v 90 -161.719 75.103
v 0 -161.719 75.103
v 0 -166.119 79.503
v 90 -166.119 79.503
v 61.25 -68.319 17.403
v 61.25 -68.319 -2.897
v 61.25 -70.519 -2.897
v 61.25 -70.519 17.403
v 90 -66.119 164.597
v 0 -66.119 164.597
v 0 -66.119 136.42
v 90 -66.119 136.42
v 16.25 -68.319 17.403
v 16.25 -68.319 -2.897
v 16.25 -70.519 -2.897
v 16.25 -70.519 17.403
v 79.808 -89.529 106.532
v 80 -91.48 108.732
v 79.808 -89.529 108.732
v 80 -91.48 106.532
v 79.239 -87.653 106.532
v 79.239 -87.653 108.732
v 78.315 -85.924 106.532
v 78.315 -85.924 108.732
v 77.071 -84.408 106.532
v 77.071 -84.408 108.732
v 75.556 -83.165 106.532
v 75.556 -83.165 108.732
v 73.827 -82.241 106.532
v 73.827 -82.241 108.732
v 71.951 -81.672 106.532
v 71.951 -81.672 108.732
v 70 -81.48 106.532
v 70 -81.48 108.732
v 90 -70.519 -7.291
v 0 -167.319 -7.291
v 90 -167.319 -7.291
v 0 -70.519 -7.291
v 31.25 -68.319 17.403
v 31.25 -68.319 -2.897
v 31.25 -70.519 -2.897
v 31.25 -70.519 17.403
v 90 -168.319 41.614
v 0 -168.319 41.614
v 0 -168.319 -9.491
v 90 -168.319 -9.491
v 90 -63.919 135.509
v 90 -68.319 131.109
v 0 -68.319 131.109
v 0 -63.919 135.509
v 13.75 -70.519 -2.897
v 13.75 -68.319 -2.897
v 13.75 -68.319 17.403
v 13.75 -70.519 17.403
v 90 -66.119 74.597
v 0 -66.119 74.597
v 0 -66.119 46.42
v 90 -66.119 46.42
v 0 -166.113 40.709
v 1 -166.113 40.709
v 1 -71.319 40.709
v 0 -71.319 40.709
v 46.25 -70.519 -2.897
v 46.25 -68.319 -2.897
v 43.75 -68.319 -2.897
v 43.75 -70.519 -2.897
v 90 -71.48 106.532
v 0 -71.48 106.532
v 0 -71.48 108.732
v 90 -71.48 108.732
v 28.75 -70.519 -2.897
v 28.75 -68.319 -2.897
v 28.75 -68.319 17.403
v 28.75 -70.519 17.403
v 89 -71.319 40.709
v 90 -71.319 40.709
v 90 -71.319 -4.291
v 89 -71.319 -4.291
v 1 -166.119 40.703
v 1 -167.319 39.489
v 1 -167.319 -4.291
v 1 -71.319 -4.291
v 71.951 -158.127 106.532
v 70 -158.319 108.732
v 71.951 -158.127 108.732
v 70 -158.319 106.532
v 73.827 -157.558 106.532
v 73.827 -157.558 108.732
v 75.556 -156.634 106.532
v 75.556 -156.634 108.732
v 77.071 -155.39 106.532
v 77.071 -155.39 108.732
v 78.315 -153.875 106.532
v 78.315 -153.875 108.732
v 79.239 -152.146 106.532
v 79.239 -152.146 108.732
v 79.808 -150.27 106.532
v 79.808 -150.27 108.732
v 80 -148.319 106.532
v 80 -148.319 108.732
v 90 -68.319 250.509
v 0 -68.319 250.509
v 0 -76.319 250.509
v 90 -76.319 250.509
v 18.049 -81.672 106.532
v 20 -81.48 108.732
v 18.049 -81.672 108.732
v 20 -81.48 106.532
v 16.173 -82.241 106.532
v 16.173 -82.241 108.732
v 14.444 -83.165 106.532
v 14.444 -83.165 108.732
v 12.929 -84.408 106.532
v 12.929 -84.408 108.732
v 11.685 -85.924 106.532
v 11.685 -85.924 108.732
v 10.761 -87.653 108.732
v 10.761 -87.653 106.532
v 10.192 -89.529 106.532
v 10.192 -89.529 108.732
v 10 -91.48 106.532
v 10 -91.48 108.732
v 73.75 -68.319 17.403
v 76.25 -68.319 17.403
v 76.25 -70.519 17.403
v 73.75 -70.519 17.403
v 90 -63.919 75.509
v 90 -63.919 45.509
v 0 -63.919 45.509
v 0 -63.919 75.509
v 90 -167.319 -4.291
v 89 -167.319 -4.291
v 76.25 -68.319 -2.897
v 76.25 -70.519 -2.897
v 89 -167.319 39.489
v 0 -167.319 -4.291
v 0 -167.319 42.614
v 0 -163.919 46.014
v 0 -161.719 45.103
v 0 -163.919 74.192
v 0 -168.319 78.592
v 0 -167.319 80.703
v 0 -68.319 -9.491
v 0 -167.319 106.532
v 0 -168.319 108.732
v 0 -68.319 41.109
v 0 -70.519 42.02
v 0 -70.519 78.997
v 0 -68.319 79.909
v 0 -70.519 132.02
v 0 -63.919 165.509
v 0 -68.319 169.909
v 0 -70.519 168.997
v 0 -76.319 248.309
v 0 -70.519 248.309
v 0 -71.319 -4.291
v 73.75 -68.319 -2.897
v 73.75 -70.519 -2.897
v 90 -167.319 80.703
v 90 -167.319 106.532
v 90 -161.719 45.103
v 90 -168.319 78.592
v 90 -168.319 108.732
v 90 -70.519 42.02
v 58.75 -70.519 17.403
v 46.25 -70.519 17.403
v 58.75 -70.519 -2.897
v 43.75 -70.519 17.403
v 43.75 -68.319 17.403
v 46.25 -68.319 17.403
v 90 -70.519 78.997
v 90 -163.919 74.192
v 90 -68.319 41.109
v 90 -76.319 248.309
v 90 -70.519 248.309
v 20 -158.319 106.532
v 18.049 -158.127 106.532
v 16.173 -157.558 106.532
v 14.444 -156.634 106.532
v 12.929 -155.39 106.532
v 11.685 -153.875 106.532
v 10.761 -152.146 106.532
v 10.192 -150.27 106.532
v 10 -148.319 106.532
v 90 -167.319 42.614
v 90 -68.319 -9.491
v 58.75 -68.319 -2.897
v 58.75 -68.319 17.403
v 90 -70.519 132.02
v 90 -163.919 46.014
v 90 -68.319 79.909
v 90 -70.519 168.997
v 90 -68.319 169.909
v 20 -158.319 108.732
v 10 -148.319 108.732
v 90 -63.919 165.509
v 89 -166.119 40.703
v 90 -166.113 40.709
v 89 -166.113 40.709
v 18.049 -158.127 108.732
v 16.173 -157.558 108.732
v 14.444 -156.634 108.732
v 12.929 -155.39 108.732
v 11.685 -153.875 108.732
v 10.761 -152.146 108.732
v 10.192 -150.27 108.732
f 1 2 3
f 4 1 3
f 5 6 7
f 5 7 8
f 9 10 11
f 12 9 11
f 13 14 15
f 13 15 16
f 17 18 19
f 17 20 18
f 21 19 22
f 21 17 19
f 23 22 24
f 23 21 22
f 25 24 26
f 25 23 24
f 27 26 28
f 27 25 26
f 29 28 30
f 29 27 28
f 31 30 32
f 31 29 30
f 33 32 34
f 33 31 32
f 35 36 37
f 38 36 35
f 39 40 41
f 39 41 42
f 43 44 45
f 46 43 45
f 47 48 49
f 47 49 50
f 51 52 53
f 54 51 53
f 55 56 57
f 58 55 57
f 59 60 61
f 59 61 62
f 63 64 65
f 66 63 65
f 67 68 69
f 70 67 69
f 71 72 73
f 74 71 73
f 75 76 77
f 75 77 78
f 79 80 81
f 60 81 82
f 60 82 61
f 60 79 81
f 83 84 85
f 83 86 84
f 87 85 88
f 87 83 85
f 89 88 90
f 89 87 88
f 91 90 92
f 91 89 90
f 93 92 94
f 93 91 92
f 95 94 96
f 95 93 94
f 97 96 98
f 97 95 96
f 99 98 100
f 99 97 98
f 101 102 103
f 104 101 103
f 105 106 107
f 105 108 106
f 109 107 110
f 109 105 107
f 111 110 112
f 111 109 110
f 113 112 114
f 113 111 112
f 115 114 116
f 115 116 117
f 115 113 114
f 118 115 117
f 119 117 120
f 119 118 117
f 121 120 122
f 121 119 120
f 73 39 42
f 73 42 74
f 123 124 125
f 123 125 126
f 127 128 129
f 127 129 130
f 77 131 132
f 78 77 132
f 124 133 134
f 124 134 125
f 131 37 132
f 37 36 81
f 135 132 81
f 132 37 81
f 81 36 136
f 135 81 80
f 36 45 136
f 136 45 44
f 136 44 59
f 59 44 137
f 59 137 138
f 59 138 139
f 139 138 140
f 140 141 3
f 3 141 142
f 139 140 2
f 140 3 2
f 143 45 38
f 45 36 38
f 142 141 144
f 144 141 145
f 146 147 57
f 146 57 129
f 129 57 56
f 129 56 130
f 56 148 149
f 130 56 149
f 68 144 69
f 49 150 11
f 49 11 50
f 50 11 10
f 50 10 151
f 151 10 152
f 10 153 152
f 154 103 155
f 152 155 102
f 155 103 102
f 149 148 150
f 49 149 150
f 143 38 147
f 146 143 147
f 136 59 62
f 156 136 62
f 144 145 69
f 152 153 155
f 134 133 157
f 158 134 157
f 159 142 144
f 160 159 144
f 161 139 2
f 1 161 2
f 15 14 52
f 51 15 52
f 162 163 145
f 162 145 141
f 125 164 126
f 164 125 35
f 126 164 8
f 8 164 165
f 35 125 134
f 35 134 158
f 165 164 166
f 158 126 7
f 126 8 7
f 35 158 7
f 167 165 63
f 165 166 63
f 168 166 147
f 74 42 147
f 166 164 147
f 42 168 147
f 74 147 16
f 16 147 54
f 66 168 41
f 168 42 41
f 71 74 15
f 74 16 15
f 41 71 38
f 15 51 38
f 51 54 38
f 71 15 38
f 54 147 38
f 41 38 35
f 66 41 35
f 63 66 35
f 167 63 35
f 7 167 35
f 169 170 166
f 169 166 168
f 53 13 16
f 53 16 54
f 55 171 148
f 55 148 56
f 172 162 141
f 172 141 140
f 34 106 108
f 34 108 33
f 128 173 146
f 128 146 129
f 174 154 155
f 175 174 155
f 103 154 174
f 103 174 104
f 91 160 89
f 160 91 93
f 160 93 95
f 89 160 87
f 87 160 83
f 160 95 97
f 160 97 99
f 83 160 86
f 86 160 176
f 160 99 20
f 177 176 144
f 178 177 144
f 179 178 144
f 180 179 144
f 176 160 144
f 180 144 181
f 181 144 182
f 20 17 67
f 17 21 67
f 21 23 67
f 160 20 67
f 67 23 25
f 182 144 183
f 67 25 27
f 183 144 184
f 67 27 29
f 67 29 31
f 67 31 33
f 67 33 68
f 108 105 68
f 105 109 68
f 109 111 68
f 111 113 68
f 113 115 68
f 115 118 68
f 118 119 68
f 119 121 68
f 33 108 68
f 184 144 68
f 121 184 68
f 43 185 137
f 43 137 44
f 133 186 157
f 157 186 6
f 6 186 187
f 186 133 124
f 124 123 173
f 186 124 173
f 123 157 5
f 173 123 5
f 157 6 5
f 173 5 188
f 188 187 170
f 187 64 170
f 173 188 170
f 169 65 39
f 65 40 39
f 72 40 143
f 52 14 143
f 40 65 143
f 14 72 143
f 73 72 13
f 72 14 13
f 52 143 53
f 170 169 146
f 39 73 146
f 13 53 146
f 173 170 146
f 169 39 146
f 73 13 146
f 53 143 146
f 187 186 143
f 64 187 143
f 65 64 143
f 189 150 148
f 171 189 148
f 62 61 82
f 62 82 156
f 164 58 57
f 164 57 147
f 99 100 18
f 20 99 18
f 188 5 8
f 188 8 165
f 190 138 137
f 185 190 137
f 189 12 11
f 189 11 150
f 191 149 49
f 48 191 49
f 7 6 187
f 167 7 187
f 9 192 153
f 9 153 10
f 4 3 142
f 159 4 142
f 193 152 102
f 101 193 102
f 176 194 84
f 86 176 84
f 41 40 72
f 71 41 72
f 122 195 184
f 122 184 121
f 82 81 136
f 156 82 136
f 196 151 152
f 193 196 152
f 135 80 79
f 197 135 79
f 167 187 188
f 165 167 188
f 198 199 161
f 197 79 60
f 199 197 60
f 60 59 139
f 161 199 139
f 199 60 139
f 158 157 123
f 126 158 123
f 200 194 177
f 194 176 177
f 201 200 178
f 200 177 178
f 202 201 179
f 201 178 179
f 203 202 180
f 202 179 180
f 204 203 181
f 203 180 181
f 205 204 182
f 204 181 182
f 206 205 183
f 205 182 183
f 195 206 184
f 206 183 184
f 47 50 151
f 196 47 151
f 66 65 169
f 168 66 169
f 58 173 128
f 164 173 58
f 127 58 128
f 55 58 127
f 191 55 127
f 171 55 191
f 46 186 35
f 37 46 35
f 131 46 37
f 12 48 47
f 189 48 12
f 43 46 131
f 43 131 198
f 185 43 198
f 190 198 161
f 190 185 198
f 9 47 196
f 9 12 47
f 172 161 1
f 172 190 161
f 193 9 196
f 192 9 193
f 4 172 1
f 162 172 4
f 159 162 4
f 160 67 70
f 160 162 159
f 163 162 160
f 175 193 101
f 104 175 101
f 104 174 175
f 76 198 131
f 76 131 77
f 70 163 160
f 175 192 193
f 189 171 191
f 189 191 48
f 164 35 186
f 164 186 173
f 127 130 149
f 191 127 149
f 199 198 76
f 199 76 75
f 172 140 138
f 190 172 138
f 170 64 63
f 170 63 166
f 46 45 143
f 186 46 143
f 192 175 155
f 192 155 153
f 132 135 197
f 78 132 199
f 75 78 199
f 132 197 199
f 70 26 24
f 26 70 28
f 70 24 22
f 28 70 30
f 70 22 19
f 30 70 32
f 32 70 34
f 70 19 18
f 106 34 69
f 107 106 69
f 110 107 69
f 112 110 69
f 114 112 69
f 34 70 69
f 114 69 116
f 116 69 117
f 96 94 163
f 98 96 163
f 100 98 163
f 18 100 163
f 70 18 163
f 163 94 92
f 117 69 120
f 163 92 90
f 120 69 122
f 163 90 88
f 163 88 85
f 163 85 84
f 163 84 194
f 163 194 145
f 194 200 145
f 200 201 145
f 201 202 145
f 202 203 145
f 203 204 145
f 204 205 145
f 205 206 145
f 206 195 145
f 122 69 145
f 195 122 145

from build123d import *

# Parameters (mm, degrees)
F0_W     = 96.8
F0_H     = 2.2
F0_W_2   = 2.2
F0_W_3   = 1
F0_W_4   = 5.8
F0_W_5   = 95.8395342231
F1_DEPTH = 90
F2_W     = 1
F2_H     = 45
F3_DEPTH = 96
F4_W     = 70
F4_H     = 76.8395342231
F5_DEPTH = 25
F6_R     = 10
F7_W     = 2.5
F7_H     = 20.3
F8_DEPTH = 25


# Not quite as in the source:
# - ends of sketch curves that miss each other by under 0.0002 mm in the source are joined


with BuildPart() as f1:
    # F0 (on Right) → F1 (new body)
    with BuildSketch(Plane.YZ):
        Polygon((-70.5190410137, 78.9974663137), (-66.1190410137, 74.5974663137), (-66.1190410137, 46.4200059881), (-70.5190410137, 42.0200059881), (-70.5190410137, -7.2912638491), (-68.3190410137, -7.2912638491), (-68.3190410137, 41.1087361509), (-63.9190410137, 45.5087361509), (-63.9190410137, 75.5087361509), (-68.3190410137, 79.9087361509), (-68.3190410137, 131.1087361509), (-63.9190410137, 135.5087361509), (-63.9190384975, 165.5087359606), (-68.3190385763, 169.9087361509), (-68.3190385763, 240.5087361509), (-68.3190385763, 248.3087361509), (-70.5190385763, 248.3087361509), (-70.5190385763, 238.3087361509), (-70.5190385763, 168.9974663137), (-66.1190385763, 164.5974663137), (-66.1190410137, 136.4200059881), (-70.5190410137, 132.0200059881), align=None)
        with Locations((-118.9190410137, -8.3912638491)):
            Rectangle(F0_W, F0_H)
        with Locations((-69.4190410137, -8.3912638491)):
            Rectangle(F0_W_2, F0_H)
        Polygon((-168.3190410137, -7.2912638491), (-167.3190410137, -7.2912638491), (-167.3190410137, 39.4887340454), (-168.3190410137, 38.4768152958), align=None)
        with Locations((-167.8190410137, -8.3912638491)):
            Rectangle(F0_W_3, F0_H)
        Polygon((-168.3190410137, 38.4768152958), (-167.3190410137, 39.4887340454), (-167.3190410137, 42.6143072478), (-168.3190410137, 41.6143048104), align=None)
        Polygon((-167.3190410137, 42.6143072478), (-167.3190410137, 39.4887340454), (-166.1190411219, 40.7030364356), (-161.7190464841, 45.1030417978), (-161.7190408009, 75.1030386029), (-166.1190410137, 79.5030349731), (-167.3190410137, 80.7030349731), (-167.3190410137, 77.5917651359), (-163.9190410137, 74.1917651359), (-163.9190475947, 46.0143089539), align=None)
        with Locations((-73.4190385763, 249.4087361509)):
            Rectangle(F0_W_4, F0_H)
        with Locations((-69.4190385763, 249.4087361509)):
            Rectangle(F0_W_2, F0_H)
        Polygon((-168.3190410137, 78.5917651359), (-167.3190410137, 77.5917651359), (-167.3190410137, 80.7030349731), (-168.3190410137, 81.7030349731), align=None)
        Polygon((-168.3190410137, 81.7030349731), (-167.3190410137, 80.7030349731), (-167.3190410137, 106.5323576331), (-168.3190410137, 106.5323576331), align=None)
        with Locations((-167.8190410137, 107.6323576331)):
            Rectangle(F0_W_3, F0_H)
        with Locations((-119.3992739022, 107.6323576331)):
            Rectangle(F0_W_5, F0_H)
    extrude(amount=F1_DEPTH)

    # F2 (on face) → F3 (join)
    with BuildSketch(Plane(origin=(0, -167.3190410137, 0), x_dir=(-1, 0, 0), z_dir=(0, 1, 0))):
        with Locations((-89.5, 18.2087361509)):
            Rectangle(F2_W, F2_H)
        with Locations((-0.5, 18.2087361509)):
            Rectangle(F2_W, F2_H)
    extrude(amount=F3_DEPTH)

    # F4 (on face) → F5 (cut)
    with BuildSketch(Plane.XY.offset(108.7323576331)):
        with Locations((45, -119.8992739022)):
            Rectangle(F4_W, F4_H)
    extrude(amount=-F5_DEPTH, mode=Mode.SUBTRACT)

    # F6
    f6_edges = [f1.edges().sort_by_distance(p)[0] for p in [
        (10, -81.479507, 107.632358),
        (10, -158.319041, 107.632358),
        (80, -81.479507, 107.632358),
        (80, -158.319041, 107.632358),
    ]]
    fillet(f6_edges, radius=F6_R)

    # F7 (on face) → F8 (cut)
    with BuildSketch(Plane(origin=(0, -68.3190410137, 0), x_dir=(-1, 0, 0), z_dir=(0, 1, 0))):
        with Locations((-75, 7.2530107699)):
            Rectangle(F7_W, F7_H)
        with Locations((-60, 7.2530107699)):
            Rectangle(F7_W, F7_H)
        with Locations((-45, 7.2530107699)):
            Rectangle(F7_W, F7_H)
        with Locations((-30, 7.2530107699)):
            Rectangle(F7_W, F7_H)
        with Locations((-15, 7.2530107699)):
            Rectangle(F7_W, F7_H)
    extrude(amount=-F8_DEPTH, mode=Mode.SUBTRACT)


solid = f1.part
